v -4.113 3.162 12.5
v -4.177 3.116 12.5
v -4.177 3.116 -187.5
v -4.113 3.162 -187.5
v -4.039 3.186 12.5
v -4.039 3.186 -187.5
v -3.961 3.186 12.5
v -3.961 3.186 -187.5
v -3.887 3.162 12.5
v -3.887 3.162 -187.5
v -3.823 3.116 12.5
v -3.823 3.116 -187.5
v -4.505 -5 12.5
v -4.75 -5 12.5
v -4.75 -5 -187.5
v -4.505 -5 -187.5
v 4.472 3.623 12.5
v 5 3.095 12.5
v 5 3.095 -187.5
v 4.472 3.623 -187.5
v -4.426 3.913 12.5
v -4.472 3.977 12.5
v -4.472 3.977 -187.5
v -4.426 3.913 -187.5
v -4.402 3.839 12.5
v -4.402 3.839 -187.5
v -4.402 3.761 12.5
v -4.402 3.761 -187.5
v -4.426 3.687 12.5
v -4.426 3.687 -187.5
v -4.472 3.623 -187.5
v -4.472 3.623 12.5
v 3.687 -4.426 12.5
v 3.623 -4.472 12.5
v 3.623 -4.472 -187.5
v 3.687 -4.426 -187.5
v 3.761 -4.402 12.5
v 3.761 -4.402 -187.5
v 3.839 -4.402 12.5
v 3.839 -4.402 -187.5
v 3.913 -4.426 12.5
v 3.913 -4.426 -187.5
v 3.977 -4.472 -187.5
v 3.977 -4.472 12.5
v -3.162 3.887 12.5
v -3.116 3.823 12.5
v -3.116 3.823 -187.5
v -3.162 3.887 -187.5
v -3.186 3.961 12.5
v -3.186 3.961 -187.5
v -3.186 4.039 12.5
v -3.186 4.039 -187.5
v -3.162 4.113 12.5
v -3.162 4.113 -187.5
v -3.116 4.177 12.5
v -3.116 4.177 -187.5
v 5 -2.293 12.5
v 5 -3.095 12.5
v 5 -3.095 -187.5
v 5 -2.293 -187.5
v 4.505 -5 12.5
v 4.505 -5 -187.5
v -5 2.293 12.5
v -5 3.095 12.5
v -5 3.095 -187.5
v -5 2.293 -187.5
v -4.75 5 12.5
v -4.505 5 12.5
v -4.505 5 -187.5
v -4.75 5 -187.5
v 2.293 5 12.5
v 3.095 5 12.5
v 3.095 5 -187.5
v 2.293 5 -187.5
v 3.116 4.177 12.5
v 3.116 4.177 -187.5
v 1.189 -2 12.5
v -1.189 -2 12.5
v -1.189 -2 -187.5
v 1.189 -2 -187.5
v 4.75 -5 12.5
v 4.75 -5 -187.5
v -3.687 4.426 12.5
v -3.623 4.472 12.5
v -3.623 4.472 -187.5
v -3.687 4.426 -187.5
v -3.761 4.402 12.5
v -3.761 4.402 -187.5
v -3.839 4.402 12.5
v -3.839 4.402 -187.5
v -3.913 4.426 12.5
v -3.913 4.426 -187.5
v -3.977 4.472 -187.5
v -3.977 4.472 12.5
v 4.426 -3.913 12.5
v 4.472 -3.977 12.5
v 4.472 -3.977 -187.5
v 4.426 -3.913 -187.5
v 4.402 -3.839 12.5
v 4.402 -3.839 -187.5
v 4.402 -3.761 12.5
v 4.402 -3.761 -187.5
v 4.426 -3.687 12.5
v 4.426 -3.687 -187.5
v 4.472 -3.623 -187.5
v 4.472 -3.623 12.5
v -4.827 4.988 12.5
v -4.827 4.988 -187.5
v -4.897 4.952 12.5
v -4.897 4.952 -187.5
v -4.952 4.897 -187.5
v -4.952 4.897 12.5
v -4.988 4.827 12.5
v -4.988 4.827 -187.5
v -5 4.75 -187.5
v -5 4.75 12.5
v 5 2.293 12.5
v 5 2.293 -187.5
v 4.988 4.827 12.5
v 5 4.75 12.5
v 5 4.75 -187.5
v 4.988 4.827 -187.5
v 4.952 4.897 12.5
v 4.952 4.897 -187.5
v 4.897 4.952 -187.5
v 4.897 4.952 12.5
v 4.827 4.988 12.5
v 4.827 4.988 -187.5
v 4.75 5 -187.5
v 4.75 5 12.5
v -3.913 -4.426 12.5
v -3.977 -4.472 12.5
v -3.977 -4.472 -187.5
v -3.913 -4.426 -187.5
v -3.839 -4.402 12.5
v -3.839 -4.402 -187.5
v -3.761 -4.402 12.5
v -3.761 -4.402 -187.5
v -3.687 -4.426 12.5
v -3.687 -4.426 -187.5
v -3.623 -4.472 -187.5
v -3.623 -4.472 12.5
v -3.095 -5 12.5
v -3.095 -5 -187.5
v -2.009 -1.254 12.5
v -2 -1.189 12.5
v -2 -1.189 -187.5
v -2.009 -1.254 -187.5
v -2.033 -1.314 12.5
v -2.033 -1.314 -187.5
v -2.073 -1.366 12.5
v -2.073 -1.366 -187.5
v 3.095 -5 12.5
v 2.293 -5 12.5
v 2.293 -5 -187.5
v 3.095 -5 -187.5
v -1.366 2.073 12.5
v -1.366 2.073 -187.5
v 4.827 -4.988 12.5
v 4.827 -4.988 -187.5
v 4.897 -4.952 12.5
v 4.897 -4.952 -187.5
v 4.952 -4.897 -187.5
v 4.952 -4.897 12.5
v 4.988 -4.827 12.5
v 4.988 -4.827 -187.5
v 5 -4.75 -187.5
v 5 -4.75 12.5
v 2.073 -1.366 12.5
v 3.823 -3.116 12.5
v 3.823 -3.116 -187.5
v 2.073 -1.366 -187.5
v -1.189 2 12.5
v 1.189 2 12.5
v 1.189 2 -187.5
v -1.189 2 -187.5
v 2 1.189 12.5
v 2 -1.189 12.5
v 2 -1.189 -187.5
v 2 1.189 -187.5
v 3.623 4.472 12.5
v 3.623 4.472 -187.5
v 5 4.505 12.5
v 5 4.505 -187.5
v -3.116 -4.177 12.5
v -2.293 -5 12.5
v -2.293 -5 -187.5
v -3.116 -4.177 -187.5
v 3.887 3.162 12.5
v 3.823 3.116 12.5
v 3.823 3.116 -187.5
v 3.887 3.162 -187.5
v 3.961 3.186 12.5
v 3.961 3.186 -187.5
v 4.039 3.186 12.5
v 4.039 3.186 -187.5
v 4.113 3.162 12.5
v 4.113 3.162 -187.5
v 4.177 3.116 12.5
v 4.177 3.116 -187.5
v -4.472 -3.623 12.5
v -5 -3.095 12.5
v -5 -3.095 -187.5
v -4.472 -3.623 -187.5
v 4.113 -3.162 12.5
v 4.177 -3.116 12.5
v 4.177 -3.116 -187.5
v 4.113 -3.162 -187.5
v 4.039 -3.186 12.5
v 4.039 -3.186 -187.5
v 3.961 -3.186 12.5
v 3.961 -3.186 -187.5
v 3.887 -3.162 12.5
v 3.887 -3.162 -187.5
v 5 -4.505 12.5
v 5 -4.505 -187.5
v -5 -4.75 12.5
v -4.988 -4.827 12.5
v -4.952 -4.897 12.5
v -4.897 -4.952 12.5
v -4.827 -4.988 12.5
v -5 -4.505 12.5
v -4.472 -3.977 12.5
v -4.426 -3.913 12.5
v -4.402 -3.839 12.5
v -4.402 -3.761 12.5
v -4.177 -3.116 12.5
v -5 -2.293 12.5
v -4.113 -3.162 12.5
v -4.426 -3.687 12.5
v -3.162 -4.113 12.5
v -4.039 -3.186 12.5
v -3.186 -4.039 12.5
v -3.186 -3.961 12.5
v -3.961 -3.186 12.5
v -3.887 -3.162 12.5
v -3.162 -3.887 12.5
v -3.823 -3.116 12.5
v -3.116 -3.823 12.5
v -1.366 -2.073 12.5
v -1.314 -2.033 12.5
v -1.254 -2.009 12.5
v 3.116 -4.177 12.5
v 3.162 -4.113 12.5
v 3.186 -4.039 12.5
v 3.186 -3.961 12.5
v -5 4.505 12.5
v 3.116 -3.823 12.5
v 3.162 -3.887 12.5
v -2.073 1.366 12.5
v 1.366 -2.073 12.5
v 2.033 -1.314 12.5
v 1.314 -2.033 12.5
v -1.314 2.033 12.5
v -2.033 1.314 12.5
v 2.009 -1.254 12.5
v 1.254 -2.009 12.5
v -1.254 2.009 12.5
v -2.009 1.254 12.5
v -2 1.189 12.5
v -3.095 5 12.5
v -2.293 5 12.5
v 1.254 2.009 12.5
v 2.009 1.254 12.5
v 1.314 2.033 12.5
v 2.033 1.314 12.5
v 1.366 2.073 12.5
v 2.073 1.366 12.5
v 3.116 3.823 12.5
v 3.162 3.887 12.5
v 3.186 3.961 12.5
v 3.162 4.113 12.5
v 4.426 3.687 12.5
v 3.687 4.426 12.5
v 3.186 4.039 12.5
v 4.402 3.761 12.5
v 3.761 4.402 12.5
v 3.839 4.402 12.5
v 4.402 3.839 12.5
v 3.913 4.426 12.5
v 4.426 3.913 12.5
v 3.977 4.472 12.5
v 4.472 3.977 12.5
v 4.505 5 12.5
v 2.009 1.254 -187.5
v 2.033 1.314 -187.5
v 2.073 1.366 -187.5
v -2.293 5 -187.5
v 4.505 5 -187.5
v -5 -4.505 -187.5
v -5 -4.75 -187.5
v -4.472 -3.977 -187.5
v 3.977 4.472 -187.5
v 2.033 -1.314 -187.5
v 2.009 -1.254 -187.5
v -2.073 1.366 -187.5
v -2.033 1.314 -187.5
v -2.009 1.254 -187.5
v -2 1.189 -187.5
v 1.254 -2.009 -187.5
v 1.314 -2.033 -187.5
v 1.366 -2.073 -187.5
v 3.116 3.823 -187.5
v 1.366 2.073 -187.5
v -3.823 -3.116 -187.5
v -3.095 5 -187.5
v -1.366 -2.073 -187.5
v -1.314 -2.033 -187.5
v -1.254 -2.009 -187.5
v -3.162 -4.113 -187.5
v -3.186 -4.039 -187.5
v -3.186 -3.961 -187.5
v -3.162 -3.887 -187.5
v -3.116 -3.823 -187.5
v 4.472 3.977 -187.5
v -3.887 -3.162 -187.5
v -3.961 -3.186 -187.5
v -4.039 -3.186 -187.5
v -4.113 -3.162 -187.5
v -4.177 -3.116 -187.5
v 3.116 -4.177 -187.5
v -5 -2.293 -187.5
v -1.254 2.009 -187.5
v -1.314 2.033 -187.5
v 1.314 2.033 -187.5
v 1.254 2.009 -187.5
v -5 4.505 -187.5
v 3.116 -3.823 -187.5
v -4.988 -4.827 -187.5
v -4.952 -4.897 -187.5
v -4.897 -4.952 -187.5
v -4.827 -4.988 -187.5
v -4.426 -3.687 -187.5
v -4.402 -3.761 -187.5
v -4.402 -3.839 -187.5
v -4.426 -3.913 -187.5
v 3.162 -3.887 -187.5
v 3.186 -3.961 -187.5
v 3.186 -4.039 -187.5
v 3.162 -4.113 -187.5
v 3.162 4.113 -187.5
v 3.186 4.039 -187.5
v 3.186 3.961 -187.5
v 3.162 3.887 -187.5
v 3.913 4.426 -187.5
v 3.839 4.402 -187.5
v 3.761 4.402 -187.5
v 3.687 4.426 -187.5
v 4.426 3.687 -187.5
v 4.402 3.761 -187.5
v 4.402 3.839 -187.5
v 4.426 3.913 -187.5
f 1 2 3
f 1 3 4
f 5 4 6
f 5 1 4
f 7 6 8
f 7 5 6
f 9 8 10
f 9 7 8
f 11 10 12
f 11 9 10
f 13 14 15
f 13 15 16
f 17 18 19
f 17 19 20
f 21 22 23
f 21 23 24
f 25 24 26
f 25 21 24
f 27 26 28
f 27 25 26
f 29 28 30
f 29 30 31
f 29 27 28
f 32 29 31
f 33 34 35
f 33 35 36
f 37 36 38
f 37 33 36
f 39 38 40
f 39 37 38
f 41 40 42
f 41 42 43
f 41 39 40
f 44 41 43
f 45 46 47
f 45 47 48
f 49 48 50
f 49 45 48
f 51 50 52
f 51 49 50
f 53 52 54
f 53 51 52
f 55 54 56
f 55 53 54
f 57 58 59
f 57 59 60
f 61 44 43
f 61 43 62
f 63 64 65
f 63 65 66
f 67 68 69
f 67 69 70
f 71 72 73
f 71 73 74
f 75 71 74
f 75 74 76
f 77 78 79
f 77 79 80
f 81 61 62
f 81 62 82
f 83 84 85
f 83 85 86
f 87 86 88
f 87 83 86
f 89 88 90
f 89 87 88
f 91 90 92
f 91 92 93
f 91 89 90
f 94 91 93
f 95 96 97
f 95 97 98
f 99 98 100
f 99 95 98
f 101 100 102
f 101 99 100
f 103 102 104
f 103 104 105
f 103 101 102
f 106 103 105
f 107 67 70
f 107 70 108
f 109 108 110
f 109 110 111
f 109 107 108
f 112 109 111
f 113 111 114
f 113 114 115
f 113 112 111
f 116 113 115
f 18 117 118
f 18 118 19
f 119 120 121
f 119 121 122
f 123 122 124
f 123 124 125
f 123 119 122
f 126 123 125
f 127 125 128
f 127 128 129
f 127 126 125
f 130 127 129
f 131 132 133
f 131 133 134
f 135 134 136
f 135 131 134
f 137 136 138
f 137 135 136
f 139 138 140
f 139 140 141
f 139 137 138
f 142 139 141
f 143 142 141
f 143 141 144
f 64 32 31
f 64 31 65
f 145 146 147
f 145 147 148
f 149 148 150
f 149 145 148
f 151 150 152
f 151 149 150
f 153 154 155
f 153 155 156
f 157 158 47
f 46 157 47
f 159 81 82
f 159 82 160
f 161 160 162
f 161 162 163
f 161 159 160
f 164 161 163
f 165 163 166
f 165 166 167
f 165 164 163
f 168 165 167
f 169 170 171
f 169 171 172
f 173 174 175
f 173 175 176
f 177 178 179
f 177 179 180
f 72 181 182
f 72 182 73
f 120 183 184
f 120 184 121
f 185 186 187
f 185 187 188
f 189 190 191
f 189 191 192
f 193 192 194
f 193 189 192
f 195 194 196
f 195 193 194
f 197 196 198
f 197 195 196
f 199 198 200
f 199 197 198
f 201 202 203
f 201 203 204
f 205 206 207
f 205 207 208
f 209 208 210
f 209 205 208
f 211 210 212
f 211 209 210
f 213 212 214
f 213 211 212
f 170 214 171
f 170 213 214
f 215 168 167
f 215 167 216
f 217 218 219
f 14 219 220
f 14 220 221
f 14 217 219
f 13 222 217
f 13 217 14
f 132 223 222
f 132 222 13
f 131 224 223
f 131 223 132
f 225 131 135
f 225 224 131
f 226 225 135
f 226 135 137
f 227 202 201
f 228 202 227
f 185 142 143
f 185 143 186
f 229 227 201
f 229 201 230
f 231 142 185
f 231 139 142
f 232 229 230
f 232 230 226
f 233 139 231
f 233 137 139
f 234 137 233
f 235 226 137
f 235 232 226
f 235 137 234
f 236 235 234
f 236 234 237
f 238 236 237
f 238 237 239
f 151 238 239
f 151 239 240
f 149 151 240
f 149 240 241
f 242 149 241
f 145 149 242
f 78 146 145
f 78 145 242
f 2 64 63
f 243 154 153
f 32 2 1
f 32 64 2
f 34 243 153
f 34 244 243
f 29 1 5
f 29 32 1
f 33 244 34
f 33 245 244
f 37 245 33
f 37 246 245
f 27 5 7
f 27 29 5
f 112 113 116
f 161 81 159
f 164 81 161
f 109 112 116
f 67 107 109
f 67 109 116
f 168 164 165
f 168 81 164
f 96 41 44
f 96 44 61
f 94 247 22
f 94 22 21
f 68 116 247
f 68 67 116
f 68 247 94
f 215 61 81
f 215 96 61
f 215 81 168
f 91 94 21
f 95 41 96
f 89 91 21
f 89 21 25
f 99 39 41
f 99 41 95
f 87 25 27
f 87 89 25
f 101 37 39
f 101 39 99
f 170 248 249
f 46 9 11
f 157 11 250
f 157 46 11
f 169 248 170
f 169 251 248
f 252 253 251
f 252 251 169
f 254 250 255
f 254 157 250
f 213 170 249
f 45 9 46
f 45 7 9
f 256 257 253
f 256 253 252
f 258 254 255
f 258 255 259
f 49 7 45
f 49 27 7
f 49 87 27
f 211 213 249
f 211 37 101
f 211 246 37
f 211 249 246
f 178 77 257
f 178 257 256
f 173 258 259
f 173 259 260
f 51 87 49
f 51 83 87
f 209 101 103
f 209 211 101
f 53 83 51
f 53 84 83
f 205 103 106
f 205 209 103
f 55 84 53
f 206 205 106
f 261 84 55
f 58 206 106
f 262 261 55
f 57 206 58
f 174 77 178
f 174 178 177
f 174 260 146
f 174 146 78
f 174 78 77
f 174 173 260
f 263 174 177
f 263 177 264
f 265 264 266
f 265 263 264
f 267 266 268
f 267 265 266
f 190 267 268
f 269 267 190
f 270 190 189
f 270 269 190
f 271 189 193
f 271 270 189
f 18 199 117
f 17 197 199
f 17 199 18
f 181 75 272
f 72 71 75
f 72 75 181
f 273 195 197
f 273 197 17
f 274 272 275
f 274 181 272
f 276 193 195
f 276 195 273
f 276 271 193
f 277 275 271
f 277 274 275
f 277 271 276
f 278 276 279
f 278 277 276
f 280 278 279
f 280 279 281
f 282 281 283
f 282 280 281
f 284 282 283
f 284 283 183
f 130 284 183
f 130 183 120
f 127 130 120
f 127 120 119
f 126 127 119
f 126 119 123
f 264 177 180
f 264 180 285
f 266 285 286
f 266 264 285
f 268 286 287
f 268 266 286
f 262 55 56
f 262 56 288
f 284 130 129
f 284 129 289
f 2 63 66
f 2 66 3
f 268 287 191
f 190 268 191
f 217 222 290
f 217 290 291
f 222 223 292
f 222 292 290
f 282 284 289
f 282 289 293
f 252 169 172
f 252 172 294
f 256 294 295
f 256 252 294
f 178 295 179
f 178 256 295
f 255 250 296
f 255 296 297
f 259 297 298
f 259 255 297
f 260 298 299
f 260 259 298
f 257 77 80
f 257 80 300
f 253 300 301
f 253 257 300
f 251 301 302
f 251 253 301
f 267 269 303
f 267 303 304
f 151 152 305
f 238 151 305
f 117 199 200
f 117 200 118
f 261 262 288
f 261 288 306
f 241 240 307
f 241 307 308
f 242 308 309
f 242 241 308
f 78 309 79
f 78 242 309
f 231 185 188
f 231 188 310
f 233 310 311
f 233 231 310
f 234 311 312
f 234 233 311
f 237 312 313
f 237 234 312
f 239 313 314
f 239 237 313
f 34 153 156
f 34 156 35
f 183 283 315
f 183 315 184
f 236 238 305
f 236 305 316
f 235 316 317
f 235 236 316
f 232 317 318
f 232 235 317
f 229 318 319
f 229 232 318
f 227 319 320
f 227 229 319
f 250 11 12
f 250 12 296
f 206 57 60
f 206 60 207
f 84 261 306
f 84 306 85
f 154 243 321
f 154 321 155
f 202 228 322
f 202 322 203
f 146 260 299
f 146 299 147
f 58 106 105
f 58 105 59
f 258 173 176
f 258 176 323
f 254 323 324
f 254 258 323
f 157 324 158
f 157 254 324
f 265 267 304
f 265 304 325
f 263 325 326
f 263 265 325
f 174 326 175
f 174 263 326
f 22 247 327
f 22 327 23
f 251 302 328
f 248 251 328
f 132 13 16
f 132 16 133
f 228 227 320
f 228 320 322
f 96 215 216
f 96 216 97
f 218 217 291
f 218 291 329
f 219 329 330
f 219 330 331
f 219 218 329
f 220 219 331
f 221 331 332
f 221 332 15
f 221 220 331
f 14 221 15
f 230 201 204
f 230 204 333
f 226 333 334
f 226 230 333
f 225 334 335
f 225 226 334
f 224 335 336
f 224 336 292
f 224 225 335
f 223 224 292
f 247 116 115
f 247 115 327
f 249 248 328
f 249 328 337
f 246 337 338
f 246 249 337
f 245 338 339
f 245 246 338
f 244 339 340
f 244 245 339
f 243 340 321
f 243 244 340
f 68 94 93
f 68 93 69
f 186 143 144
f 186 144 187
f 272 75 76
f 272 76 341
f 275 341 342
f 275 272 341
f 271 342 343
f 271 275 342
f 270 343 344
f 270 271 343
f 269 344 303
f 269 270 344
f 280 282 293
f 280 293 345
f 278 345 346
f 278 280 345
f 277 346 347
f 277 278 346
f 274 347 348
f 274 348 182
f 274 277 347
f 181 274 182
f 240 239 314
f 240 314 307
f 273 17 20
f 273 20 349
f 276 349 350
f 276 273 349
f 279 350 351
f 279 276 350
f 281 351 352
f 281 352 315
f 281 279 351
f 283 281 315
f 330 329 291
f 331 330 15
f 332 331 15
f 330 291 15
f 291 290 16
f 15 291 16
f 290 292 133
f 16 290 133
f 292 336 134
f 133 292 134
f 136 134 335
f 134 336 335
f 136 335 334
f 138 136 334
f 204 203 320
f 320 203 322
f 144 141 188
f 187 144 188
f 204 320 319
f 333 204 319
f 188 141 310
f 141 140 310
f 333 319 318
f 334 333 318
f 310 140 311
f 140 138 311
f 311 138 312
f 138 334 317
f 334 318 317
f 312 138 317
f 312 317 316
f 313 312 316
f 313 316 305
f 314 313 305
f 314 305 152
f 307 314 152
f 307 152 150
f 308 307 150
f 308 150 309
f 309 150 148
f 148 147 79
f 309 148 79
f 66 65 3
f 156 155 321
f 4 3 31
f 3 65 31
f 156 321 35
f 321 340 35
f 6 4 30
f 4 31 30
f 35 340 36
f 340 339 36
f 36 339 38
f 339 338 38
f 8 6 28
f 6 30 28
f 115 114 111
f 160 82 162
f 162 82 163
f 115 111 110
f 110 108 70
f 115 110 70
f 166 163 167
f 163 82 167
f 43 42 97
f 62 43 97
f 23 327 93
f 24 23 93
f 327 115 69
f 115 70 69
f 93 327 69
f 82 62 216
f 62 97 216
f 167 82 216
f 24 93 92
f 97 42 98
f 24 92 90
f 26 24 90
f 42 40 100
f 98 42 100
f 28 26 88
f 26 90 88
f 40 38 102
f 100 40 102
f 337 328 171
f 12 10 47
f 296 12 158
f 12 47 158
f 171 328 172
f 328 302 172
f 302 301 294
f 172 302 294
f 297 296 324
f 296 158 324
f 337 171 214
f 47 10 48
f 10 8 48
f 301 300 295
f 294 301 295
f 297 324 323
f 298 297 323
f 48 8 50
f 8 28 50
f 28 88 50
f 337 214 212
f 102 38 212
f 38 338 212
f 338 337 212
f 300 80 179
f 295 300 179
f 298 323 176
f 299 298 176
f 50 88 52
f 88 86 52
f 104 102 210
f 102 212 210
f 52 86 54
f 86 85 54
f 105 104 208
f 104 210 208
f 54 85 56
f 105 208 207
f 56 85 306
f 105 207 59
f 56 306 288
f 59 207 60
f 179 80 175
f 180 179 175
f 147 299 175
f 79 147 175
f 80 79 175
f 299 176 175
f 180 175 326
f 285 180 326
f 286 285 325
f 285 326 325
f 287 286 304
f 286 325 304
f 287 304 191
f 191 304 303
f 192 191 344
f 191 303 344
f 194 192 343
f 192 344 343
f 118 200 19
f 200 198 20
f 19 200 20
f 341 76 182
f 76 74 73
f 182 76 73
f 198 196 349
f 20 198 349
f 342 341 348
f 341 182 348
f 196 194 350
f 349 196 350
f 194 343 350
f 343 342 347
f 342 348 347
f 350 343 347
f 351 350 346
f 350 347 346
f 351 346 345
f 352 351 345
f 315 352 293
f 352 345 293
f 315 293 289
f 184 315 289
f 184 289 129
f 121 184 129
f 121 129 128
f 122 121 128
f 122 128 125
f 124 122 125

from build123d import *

# Parameters (mm, degrees)
BOSS_EXTRUDE1_DEPTH = 200


with BuildPart() as part:
    # Sketch1 → Boss-Extrude1 (new body)
    with BuildSketch(Plane.XY.offset(12.5)):
        with BuildLine():
            Line((1.189339828, 2), (-1.189339828, 2))
            ThreePointArc((-1.189339828, 2), (-1.285010686, 2.019030117), (-1.366116524, 2.073223305))
            Line((-1.366116524, 2.073223305), (-3.116116524, 3.823223305))
            ThreePointArc((-3.116116524, 3.823223305), (-3.189339828, 4), (-3.116116524, 4.176776695))
            Line((-3.116116524, 4.176776695), (-2.292893219, 5))
            Line((-2.292893219, 5), (-3.094974747, 5))
            Line((-3.094974747, 5), (-3.623223305, 4.471751442))
            ThreePointArc((-3.623223305, 4.471751442), (-3.8, 4.398528137), (-3.976776695, 4.471751442))
            Line((-3.976776695, 4.471751442), (-4.505025253, 5))
            Line((-4.505025253, 5), (-4.75, 5))
            ThreePointArc((-4.75, 5), (-4.926776695, 4.926776695), (-5, 4.75))
            Line((-5, 4.75), (-5, 4.505025253))
            Line((-5, 4.505025253), (-4.471751442, 3.976776695))
            ThreePointArc((-4.471751442, 3.976776695), (-4.398528137, 3.8), (-4.471751442, 3.623223305))
            Line((-4.471751442, 3.623223305), (-5, 3.094974747))
            Line((-5, 3.094974747), (-5, 2.292893219))
            Line((-5, 2.292893219), (-4.176776695, 3.116116524))
            ThreePointArc((-4.176776695, 3.116116524), (-4, 3.189339828), (-3.823223305, 3.116116524))
            Line((-3.823223305, 3.116116524), (-2.073223305, 1.366116524))
            ThreePointArc((-2.073223305, 1.366116524), (-2.019030117, 1.285010686), (-2, 1.189339828))
            Line((-2, 1.189339828), (-2, -1.189339828))
            ThreePointArc((-2, -1.189339828), (-2.019030117, -1.285010686), (-2.073223305, -1.366116524))
            Line((-2.073223305, -1.366116524), (-3.823223305, -3.116116524))
            ThreePointArc((-3.823223305, -3.116116524), (-4, -3.189339828), (-4.176776695, -3.116116524))
            Line((-4.176776695, -3.116116524), (-5, -2.292893219))
            Line((-5, -2.292893219), (-5, -3.094974747))
            Line((-5, -3.094974747), (-4.471751442, -3.623223305))
            ThreePointArc((-4.471751442, -3.623223305), (-4.398528137, -3.8), (-4.471751442, -3.976776695))
            Line((-4.471751442, -3.976776695), (-5, -4.505025253))
            Line((-5, -4.505025253), (-5, -4.75))
            ThreePointArc((-5, -4.75), (-4.926776695, -4.926776695), (-4.75, -5))
            Line((-4.75, -5), (-4.505025253, -5))
            Line((-4.505025253, -5), (-3.976776695, -4.471751442))
            ThreePointArc((-3.976776695, -4.471751442), (-3.8, -4.398528137), (-3.623223305, -4.471751442))
            Line((-3.623223305, -4.471751442), (-3.094974747, -5))
            Line((-3.094974747, -5), (-2.292893219, -5))
            Line((-2.292893219, -5), (-3.116116524, -4.176776695))
            ThreePointArc((-3.116116524, -4.176776695), (-3.189339828, -4), (-3.116116524, -3.823223305))
            Line((-3.116116524, -3.823223305), (-1.366116524, -2.073223305))
            ThreePointArc((-1.366116524, -2.073223305), (-1.285010686, -2.019030117), (-1.189339828, -2))
            Line((-1.189339828, -2), (1.189339828, -2))
            ThreePointArc((1.189339828, -2), (1.285010686, -2.019030117), (1.366116524, -2.073223305))
            Line((1.366116524, -2.073223305), (3.116116524, -3.823223305))
            ThreePointArc((3.116116524, -3.823223305), (3.189339828, -4), (3.116116524, -4.176776695))
            Line((3.116116524, -4.176776695), (2.292893219, -5))
            Line((2.292893219, -5), (3.094974747, -5))
            Line((3.094974747, -5), (3.623223305, -4.471751442))
            ThreePointArc((3.623223305, -4.471751442), (3.8, -4.398528137), (3.976776695, -4.471751442))
            Line((3.976776695, -4.471751442), (4.505025253, -5))
            Line((4.505025253, -5), (4.75, -5))
            ThreePointArc((4.75, -5), (4.926776695, -4.926776695), (5, -4.75))
            Line((5, -4.75), (5, -4.505025253))
            Line((5, -4.505025253), (4.471751442, -3.976776695))
            ThreePointArc((4.471751442, -3.976776695), (4.398528137, -3.8), (4.471751442, -3.623223305))
            Line((4.471751442, -3.623223305), (5, -3.094974747))
            Line((5, -3.094974747), (5, -2.292893219))
            Line((5, -2.292893219), (4.176776695, -3.116116524))
            ThreePointArc((4.176776695, -3.116116524), (4, -3.189339828), (3.823223305, -3.116116524))
            Line((3.823223305, -3.116116524), (2.073223305, -1.366116524))
            ThreePointArc((2.073223305, -1.366116524), (2.019030117, -1.285010686), (2, -1.189339828))
            Line((2, -1.189339828), (2, 1.189339828))
            ThreePointArc((2, 1.189339828), (2.019030117, 1.285010686), (2.073223305, 1.366116524))
            Line((2.073223305, 1.366116524), (3.823223305, 3.116116524))
            ThreePointArc((3.823223305, 3.116116524), (4, 3.189339828), (4.176776695, 3.116116524))
            Line((4.176776695, 3.116116524), (5, 2.292893219))
            Line((5, 2.292893219), (5, 3.094974747))
            Line((5, 3.094974747), (4.471751442, 3.623223305))
            ThreePointArc((4.471751442, 3.623223305), (4.398528137, 3.8), (4.471751442, 3.976776695))
            Line((4.471751442, 3.976776695), (5, 4.505025253))
            Line((5, 4.505025253), (5, 4.75))
            ThreePointArc((5, 4.75), (4.926776695, 4.926776695), (4.75, 5))
            Line((4.75, 5), (4.505025253, 5))
            Line((4.505025253, 5), (3.976776695, 4.471751442))
            ThreePointArc((3.976776695, 4.471751442), (3.8, 4.398528137), (3.623223305, 4.471751442))
            Line((3.623223305, 4.471751442), (3.094974747, 5))
            Line((3.094974747, 5), (2.292893219, 5))
            Line((2.292893219, 5), (3.116116524, 4.176776695))
            ThreePointArc((3.116116524, 4.176776695), (3.189339828, 4), (3.116116524, 3.823223305))
            Line((3.116116524, 3.823223305), (1.366116524, 2.073223305))
            ThreePointArc((1.366116524, 2.073223305), (1.285010686, 2.019030117), (1.189339828, 2))
        make_face()
    extrude(amount=-BOSS_EXTRUDE1_DEPTH)


solid = part.part
